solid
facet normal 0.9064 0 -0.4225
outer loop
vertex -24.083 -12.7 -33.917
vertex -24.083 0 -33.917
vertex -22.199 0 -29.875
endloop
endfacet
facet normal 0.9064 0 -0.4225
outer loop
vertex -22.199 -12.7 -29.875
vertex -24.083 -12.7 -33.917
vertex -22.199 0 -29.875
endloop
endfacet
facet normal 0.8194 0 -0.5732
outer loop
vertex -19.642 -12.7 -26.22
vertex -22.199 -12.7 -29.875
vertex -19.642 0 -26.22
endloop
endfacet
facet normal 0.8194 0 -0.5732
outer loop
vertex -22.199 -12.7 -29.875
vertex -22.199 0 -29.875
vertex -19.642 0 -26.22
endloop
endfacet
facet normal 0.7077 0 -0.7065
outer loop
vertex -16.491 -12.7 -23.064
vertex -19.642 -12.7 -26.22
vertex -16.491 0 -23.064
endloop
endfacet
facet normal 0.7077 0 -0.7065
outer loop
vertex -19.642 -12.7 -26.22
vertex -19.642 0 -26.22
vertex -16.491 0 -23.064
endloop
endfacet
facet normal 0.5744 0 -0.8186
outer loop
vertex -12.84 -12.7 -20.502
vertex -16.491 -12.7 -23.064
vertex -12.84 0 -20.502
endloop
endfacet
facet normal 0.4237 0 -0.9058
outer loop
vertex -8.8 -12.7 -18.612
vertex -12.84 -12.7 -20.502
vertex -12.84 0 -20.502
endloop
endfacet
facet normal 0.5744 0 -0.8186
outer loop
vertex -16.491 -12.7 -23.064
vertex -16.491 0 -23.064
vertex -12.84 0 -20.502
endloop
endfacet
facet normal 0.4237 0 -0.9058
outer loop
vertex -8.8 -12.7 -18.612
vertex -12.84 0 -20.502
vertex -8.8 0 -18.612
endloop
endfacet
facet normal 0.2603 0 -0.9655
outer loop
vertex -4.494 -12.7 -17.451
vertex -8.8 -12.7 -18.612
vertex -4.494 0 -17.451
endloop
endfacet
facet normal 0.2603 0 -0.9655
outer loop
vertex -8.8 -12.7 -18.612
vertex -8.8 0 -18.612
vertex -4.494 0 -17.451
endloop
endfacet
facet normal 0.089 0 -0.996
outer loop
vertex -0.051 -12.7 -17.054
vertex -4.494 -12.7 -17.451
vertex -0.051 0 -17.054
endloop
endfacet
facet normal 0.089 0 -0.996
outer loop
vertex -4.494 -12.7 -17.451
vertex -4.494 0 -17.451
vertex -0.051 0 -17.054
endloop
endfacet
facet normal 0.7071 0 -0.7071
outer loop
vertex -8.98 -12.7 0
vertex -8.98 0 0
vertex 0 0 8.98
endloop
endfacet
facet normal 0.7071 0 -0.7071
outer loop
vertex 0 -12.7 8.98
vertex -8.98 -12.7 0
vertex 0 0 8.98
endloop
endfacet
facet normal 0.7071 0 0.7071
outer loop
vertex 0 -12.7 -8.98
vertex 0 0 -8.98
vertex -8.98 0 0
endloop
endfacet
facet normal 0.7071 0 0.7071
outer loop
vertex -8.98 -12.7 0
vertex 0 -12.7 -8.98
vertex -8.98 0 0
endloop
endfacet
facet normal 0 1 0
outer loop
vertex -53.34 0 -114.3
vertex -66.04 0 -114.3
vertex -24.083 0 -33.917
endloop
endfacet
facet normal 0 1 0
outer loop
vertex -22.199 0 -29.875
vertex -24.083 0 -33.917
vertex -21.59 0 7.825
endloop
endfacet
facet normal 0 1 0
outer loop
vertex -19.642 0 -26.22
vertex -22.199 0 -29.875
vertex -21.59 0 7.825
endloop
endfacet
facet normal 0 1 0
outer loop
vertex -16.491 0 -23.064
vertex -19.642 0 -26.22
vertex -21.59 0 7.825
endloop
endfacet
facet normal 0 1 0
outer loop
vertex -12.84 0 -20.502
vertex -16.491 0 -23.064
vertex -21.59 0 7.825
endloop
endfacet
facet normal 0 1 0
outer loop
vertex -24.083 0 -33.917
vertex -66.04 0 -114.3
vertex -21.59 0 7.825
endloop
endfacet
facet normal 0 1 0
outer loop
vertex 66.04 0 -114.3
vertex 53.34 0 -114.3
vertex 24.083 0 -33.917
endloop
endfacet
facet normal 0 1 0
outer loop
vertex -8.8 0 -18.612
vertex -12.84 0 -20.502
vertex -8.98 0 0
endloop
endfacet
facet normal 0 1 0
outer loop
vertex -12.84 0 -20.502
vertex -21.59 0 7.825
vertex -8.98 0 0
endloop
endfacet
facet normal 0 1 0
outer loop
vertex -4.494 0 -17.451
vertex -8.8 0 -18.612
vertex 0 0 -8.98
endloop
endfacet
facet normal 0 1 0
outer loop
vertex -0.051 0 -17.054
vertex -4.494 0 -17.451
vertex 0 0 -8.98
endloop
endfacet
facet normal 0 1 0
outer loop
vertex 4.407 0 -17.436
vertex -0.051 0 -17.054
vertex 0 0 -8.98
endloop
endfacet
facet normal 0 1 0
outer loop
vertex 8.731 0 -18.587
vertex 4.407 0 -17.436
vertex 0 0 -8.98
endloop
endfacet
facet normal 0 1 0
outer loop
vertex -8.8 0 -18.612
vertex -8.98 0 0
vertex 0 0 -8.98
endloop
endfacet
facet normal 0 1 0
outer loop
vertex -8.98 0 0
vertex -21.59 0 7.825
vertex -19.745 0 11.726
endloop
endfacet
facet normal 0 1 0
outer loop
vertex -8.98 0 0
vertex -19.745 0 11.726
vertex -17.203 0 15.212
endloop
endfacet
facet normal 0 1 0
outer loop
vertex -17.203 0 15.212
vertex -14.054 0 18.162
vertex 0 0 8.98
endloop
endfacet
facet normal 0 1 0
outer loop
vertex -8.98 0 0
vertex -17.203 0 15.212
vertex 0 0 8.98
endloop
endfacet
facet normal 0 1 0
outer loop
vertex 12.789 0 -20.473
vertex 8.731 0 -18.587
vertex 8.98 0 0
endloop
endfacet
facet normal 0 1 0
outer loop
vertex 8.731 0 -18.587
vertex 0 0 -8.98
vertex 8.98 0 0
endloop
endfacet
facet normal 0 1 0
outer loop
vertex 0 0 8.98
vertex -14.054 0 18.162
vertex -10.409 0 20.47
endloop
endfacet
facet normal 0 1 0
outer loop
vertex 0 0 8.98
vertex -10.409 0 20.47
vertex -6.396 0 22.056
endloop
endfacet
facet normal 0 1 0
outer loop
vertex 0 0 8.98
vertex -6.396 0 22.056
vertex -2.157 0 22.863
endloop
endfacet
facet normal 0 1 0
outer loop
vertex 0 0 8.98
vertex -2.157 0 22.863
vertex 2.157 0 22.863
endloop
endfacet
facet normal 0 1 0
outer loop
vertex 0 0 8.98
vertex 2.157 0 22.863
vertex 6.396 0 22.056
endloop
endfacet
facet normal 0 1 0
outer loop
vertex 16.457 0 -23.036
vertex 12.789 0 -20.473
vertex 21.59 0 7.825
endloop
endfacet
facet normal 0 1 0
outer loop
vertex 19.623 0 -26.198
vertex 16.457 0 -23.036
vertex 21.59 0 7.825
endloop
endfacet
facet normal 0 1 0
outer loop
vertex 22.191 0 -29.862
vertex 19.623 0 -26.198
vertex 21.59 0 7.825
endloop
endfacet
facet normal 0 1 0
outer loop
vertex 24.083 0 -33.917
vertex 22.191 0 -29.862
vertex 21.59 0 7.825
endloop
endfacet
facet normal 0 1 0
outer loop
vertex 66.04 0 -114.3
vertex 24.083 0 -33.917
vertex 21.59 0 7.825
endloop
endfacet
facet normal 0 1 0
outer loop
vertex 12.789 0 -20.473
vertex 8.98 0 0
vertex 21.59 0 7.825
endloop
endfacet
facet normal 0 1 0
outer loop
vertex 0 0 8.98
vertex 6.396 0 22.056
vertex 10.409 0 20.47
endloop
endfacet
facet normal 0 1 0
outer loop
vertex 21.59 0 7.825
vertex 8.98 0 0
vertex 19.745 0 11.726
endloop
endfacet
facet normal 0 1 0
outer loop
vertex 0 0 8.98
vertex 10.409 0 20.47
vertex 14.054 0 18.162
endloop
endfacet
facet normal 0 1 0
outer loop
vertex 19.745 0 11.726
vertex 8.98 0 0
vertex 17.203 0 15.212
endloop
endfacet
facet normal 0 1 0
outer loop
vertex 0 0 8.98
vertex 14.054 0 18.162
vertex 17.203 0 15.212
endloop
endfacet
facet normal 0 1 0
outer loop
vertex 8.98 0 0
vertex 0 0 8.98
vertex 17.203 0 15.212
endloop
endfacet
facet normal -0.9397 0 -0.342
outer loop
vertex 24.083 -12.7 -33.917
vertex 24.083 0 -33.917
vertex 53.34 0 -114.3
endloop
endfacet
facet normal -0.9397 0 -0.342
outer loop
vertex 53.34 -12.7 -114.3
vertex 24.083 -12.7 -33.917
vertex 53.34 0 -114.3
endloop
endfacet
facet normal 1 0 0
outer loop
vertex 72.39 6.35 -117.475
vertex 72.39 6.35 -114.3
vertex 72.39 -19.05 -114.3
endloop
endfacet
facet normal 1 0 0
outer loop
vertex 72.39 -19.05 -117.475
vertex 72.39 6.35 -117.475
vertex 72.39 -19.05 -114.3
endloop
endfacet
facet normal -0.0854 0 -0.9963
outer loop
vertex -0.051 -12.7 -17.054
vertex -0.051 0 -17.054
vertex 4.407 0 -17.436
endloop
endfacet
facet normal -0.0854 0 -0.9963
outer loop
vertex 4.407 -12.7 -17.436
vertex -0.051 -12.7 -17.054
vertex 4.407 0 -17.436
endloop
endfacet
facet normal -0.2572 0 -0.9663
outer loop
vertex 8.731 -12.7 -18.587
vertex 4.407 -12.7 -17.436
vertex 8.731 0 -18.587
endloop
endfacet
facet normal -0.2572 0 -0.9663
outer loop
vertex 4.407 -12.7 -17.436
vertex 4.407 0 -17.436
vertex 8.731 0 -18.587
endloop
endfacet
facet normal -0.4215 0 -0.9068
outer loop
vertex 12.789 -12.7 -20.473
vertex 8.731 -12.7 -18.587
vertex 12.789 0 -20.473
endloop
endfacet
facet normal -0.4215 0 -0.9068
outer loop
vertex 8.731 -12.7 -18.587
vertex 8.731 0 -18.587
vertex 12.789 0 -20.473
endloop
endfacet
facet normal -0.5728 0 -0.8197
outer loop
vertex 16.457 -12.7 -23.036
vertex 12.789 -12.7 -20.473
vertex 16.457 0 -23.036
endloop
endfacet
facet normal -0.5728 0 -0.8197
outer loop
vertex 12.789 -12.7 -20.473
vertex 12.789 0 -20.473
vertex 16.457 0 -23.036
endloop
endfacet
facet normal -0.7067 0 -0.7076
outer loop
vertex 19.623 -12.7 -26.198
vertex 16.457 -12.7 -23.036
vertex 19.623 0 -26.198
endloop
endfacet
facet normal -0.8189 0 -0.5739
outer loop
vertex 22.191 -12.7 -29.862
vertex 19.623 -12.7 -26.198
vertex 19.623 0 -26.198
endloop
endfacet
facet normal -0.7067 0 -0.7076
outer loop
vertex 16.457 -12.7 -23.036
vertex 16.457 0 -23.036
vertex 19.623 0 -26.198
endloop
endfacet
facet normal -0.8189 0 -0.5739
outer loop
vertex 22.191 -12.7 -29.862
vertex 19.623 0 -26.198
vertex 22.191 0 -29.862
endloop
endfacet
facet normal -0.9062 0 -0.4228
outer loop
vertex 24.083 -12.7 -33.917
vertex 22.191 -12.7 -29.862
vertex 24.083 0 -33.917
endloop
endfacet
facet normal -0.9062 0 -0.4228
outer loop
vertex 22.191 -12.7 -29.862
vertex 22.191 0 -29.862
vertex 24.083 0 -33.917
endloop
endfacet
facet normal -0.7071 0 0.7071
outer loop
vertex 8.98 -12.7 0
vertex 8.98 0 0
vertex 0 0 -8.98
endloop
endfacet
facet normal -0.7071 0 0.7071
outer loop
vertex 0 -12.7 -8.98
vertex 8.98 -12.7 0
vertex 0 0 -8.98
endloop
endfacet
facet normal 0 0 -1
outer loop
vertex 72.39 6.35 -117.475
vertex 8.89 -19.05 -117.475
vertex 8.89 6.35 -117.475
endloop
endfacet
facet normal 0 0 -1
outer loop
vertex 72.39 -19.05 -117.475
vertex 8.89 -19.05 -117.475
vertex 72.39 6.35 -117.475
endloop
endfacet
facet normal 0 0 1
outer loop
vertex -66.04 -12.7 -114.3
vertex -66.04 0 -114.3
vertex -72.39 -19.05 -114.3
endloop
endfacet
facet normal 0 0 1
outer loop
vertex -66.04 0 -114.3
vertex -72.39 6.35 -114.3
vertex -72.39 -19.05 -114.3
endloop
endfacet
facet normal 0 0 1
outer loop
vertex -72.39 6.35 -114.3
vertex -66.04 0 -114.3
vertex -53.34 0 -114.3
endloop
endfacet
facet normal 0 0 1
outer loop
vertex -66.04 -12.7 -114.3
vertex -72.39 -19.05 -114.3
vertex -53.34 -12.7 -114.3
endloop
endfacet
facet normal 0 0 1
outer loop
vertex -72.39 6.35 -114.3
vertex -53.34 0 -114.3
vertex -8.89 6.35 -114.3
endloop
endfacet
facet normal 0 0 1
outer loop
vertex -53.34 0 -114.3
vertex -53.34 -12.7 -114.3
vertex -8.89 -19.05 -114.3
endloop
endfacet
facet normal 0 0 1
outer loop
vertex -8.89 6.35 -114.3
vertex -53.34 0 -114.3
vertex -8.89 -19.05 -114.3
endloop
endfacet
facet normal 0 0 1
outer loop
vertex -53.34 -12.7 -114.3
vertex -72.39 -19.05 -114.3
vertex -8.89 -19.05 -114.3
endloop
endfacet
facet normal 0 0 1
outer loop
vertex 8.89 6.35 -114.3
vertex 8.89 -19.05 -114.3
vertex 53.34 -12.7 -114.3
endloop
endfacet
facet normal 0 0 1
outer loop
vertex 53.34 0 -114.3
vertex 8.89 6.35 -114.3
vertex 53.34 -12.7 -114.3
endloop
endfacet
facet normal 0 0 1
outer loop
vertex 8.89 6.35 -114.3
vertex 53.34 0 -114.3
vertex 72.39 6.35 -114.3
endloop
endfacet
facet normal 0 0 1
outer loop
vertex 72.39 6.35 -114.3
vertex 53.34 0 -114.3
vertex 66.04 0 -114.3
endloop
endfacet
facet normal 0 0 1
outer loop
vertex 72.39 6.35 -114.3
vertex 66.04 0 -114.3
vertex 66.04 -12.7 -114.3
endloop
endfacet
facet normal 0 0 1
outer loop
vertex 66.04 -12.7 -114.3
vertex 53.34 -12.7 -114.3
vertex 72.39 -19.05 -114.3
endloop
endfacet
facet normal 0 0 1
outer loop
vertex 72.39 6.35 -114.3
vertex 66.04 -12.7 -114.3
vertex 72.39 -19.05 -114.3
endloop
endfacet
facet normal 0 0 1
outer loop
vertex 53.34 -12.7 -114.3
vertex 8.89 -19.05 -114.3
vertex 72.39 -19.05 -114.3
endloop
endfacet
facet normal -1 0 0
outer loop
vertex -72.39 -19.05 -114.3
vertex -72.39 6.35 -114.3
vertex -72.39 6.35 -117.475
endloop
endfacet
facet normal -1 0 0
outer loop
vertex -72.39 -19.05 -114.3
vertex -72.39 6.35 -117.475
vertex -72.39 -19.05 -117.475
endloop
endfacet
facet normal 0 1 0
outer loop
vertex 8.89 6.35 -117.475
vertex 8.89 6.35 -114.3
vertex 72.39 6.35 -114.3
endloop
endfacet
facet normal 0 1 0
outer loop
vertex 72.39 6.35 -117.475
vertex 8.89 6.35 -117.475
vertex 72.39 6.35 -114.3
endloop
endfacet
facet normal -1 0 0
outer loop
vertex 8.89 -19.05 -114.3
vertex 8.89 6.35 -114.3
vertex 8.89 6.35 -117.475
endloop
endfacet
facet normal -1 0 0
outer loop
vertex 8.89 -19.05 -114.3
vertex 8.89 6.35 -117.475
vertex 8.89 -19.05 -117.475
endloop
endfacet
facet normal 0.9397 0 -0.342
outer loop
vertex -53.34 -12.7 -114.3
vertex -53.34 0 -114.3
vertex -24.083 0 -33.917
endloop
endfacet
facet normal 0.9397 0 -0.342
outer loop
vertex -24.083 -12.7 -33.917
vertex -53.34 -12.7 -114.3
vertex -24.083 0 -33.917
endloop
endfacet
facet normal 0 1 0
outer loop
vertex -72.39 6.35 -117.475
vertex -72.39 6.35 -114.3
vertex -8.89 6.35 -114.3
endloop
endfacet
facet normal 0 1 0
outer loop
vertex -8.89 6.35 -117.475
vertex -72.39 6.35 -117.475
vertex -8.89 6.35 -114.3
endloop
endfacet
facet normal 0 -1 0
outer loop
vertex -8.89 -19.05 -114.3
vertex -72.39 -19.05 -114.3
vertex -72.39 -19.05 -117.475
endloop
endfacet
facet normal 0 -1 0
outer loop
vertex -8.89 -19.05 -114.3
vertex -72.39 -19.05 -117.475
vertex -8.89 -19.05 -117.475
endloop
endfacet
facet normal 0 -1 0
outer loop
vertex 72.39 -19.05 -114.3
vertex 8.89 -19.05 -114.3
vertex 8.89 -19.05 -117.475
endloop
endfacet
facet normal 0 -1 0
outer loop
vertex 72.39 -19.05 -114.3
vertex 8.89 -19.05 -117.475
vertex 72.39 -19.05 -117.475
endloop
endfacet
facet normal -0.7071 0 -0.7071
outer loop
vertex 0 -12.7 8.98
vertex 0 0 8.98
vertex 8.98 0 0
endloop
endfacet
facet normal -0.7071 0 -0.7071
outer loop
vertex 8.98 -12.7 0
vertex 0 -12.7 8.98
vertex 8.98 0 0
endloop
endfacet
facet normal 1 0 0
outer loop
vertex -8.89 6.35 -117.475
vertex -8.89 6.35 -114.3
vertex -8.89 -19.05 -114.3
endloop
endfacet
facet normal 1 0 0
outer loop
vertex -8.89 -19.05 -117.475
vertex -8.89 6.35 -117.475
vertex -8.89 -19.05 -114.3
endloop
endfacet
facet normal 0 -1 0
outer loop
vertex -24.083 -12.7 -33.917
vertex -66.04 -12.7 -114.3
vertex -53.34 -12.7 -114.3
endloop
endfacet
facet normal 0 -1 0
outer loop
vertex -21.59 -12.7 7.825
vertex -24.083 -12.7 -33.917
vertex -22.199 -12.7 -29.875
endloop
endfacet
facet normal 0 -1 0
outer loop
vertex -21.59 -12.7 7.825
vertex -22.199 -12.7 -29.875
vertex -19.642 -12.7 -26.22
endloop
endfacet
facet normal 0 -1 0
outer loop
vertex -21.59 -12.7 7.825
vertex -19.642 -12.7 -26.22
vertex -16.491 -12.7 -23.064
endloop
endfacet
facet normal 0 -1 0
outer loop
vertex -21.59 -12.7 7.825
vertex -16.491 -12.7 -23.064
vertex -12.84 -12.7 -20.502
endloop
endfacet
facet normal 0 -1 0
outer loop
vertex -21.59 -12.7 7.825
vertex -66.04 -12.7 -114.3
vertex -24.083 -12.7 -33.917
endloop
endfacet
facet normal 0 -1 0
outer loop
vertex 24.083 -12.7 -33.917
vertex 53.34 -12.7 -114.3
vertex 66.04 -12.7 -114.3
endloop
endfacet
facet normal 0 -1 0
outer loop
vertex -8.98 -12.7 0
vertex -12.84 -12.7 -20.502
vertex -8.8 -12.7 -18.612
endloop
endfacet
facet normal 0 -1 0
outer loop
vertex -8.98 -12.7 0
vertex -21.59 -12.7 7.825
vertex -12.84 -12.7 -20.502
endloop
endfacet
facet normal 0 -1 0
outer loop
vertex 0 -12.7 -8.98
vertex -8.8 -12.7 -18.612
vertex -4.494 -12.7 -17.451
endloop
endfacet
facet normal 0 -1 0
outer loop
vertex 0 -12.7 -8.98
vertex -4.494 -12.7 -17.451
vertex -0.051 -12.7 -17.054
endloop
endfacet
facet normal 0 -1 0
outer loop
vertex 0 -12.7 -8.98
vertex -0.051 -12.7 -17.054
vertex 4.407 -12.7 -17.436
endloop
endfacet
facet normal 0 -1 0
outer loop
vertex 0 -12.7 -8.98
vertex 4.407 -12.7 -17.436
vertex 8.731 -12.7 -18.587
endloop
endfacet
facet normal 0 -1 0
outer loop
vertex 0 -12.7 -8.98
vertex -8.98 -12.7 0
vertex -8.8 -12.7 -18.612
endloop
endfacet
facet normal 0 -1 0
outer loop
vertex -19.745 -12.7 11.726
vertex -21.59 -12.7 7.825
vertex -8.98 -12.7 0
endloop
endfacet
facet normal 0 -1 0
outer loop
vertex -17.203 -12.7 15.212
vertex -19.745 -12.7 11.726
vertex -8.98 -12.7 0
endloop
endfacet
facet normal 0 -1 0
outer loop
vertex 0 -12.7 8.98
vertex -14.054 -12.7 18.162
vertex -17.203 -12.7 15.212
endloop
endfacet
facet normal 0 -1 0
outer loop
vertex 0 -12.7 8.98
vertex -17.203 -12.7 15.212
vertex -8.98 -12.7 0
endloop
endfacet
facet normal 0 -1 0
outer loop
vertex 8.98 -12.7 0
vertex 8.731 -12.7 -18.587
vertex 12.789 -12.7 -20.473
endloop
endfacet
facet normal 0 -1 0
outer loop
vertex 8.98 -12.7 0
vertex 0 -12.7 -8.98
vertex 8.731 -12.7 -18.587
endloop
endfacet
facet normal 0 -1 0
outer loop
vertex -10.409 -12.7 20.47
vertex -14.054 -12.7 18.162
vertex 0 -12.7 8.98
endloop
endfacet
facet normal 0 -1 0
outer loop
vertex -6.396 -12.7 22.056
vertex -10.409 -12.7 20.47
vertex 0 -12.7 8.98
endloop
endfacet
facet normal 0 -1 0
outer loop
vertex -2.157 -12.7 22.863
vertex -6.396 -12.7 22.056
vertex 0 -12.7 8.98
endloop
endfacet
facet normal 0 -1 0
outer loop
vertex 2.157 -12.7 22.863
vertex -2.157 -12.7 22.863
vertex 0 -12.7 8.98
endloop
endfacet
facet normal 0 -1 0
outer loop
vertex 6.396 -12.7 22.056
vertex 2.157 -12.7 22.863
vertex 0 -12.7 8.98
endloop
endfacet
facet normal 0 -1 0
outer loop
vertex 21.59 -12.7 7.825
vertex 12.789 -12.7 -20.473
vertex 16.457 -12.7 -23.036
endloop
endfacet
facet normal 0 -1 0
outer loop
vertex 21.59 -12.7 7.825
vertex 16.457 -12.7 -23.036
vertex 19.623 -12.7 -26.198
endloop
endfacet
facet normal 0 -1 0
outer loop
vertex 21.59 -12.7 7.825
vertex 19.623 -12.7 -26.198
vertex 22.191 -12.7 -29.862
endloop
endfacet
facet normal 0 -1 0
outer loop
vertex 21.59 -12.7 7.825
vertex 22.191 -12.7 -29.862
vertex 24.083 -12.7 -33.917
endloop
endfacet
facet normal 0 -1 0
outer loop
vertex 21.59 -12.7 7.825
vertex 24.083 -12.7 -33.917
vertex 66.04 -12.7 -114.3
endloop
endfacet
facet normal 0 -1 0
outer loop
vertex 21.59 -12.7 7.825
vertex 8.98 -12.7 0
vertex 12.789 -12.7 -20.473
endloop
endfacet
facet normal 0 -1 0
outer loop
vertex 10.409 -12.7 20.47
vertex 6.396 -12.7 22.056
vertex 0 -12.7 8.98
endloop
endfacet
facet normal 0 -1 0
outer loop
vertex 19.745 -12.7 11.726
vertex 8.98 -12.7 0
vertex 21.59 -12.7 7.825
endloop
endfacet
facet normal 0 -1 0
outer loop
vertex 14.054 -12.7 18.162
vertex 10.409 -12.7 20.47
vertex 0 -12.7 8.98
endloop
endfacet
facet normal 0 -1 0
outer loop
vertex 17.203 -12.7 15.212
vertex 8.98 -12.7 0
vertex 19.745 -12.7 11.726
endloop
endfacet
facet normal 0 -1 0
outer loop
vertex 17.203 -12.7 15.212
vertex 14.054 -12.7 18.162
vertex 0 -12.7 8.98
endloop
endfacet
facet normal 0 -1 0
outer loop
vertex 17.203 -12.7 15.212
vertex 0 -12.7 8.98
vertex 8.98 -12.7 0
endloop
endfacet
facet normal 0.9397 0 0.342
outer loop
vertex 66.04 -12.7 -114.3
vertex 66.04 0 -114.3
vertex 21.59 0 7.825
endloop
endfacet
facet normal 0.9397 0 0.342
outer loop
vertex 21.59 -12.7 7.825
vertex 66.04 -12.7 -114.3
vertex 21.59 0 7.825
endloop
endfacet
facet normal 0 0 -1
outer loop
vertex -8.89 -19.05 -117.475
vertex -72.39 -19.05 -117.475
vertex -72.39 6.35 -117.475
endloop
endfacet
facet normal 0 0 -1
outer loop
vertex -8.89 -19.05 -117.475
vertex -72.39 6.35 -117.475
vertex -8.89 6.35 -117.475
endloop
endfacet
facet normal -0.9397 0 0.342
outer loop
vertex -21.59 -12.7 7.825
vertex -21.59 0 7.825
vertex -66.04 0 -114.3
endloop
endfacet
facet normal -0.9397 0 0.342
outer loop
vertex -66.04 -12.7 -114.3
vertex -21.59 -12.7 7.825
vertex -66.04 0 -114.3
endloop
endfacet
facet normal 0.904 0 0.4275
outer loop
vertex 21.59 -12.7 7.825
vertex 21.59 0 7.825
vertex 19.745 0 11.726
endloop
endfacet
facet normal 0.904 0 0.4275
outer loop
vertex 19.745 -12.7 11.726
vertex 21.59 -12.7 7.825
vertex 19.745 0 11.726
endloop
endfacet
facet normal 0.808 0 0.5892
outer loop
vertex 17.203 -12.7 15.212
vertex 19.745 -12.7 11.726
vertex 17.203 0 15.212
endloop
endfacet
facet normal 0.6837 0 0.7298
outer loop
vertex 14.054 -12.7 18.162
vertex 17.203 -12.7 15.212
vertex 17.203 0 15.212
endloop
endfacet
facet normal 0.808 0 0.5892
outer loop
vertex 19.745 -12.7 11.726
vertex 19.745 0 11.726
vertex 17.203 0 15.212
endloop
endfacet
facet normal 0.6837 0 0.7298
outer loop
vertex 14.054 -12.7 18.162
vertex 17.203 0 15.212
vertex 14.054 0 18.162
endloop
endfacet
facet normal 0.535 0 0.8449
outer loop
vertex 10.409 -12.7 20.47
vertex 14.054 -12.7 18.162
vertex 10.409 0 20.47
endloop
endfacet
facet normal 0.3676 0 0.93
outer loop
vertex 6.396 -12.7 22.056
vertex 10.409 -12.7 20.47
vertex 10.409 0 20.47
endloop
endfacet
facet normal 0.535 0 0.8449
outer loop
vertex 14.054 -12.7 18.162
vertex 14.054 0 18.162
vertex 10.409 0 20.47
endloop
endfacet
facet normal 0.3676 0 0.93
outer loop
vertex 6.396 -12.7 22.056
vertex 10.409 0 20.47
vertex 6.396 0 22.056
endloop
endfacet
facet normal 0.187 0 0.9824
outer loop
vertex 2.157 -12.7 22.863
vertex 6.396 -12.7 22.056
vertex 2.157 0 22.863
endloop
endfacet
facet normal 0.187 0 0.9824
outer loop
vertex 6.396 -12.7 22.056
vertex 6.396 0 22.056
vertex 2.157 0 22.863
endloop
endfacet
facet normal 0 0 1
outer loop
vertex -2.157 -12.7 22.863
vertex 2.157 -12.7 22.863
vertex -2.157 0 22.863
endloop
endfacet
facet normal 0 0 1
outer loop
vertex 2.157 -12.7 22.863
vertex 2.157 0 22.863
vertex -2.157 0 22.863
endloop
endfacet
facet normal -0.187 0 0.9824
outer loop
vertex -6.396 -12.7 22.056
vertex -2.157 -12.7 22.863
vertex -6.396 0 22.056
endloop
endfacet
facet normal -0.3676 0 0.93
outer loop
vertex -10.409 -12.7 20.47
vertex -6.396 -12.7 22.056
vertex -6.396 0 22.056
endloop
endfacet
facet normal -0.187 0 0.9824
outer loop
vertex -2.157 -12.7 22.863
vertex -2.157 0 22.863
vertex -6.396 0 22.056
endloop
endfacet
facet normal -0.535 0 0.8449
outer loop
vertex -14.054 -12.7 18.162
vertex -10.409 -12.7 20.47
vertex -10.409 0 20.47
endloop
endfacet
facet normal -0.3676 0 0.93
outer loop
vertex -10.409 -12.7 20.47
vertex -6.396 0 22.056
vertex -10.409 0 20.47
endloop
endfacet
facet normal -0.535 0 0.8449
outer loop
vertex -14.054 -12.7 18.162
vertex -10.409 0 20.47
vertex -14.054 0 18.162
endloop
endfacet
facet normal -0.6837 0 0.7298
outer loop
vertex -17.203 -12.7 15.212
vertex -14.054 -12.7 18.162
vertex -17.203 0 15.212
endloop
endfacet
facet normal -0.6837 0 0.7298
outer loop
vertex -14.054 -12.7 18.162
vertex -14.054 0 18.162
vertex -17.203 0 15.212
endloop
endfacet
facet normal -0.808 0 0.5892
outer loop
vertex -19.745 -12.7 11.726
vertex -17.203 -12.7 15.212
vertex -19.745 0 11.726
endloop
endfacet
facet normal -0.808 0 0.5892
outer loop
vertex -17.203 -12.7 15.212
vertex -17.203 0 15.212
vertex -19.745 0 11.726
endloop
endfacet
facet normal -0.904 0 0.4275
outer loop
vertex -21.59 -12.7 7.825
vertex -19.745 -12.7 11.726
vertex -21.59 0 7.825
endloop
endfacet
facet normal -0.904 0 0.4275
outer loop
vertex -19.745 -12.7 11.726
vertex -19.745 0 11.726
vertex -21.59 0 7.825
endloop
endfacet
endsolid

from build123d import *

# Parameters (mm, degrees)
F1_DEPTH = 12.7
F2_W     = 63.5
F2_H     = 25.4
F3_DEPTH = 3.175
F4_W     = 63.5
F4_H     = 25.4
F5_DEPTH = 3.175


with BuildPart() as f1:
    # F0 (on Front) → F1 (new body)
    with BuildSketch(Plane.XZ):
        with BuildLine():
            ThreePointArc((21.59, 7.825371), (0, 22.964419), (-21.59, 7.825371))
            Line((-21.59, 7.825371), (-66.04, -114.3))
            Line((-66.04, -114.3), (-53.34, -114.3))
            Line((-53.34, -114.3), (-24.083093, -33.917308))
            ThreePointArc((-24.083093, -33.917308), (-14.720974, -21.703733), (-0.051192, -17.054196))
            ThreePointArc((-0.051192, -17.054196), (14.679039, -21.674371), (24.083093, -33.917308))
            Line((24.083093, -33.917308), (53.34, -114.3))
            Line((53.34, -114.3), (66.04, -114.3))
            Line((66.04, -114.3), (21.59, 7.825371))
        make_face()
        Polygon((0, 8.980256), (8.980256, 0), (0, -8.980256), (-8.980256, 0), align=None, mode=Mode.SUBTRACT)
    extrude(amount=F1_DEPTH)

    # F2 (on face) → F3 (join)
    with BuildSketch(Plane(origin=(0, 0, -114.3), x_dir=(1, 0, 0), z_dir=(0, 0, -1))):
        with Locations((-40.64, 6.35)):
            Rectangle(F2_W, F2_H)
    extrude(amount=F3_DEPTH)

    # F4 (on face) → F5 (join)
    with BuildSketch(Plane(origin=(0, 0, -114.3), x_dir=(1, 0, 0), z_dir=(0, 0, -1))):
        with Locations((40.64, 6.35)):
            Rectangle(F4_W, F4_H)
    extrude(amount=F5_DEPTH)


solid = f1.part
